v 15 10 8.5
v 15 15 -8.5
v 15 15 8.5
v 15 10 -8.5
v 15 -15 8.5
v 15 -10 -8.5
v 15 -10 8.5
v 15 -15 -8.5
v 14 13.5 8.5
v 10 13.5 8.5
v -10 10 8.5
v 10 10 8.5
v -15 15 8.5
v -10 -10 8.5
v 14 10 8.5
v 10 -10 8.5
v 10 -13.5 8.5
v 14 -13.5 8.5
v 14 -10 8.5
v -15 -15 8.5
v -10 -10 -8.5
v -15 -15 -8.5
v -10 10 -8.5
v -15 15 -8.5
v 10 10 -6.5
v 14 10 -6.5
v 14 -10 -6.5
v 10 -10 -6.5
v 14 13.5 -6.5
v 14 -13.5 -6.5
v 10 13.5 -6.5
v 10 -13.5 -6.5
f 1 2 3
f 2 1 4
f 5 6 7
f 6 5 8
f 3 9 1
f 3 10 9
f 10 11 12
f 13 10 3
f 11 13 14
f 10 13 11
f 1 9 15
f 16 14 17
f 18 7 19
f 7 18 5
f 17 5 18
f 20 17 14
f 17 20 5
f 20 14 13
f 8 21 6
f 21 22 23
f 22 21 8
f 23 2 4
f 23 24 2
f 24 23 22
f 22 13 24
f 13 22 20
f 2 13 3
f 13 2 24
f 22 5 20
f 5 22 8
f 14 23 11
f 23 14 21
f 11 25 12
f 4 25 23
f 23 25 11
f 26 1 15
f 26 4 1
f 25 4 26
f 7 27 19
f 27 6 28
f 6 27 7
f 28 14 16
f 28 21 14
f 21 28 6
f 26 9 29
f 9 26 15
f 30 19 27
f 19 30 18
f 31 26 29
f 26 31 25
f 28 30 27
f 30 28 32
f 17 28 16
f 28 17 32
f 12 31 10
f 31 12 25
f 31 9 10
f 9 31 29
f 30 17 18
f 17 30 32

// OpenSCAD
clip_inside_mm=20;
clip_thickness_mm=5;
clip_height_mm=17;
cutout_mm=4;

difference() {
    //outside dimensions of the clip
    cube([clip_inside_mm + clip_thickness_mm*2,
    clip_inside_mm + clip_thickness_mm*2,clip_height_mm], center=true);
    
    //remove the inside of the clip
    cube([clip_inside_mm,clip_inside_mm,clip_height_mm+5], center=true);
    
    //cut out the end
    translate([clip_inside_mm/2,0,0])
    cube([clip_thickness_mm+6,clip_inside_mm,clip_height_mm+1], center=true);  
  
    translate([clip_inside_mm/2+2,0,2])
    cube([cutout_mm,27,clip_height_mm], center=true); 
}


    //this is the inside bit - remove after - used for showing where the tube will go

    //color([1,0,0])
    //cube([clip_inside_mm,clip_inside_mm,clip_height_mm+5], center=true);
